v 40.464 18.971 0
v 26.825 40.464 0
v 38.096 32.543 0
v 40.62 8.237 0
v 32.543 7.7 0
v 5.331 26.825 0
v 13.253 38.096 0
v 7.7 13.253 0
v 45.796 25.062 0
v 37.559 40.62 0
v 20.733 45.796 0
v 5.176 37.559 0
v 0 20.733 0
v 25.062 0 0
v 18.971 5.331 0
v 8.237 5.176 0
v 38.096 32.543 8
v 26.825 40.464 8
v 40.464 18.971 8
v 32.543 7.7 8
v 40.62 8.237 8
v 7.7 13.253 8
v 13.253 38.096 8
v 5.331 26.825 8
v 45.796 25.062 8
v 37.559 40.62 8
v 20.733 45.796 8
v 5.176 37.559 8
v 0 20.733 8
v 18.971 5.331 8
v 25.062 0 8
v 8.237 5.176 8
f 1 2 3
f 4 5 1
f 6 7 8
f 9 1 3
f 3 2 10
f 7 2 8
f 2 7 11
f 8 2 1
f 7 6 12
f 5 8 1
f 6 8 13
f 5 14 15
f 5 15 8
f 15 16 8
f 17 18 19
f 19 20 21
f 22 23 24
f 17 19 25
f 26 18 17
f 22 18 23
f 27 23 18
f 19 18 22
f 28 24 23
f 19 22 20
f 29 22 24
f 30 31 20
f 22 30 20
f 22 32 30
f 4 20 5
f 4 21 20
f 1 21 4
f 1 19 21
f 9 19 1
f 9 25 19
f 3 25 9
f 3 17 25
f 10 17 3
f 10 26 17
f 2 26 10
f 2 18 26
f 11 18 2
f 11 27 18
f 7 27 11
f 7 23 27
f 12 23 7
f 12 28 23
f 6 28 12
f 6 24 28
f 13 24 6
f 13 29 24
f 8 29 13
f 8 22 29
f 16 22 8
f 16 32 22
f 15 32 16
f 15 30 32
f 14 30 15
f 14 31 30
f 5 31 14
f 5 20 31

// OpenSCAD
$fn = 32;

// ----------------------------------------------------------------------
// Chain sprocket: 8 teeth, 18 mm root radius
// ----------------------------------------------------------------------

// --- parameters (mm) ---
profile_height = 8;       // extrusion height
profile_points = 16;      // points of the closed outline

profile = [[40.464, 18.971], [45.796, 25.062], [38.096, 32.543], [37.559, 40.62], [26.825, 40.464], [20.733, 45.796], [13.253, 38.096], [5.176, 37.559], [5.331, 26.825], [0, 20.733], [7.7, 13.253], [8.237, 5.176], [18.971, 5.331], [25.062, 0], [32.543, 7.7], [40.62, 8.237]];  // single closed polygon, 16 points, counter clockwise

// --- the one profile operation ---
linear_extrude(height = profile_height) polygon(points = profile);
